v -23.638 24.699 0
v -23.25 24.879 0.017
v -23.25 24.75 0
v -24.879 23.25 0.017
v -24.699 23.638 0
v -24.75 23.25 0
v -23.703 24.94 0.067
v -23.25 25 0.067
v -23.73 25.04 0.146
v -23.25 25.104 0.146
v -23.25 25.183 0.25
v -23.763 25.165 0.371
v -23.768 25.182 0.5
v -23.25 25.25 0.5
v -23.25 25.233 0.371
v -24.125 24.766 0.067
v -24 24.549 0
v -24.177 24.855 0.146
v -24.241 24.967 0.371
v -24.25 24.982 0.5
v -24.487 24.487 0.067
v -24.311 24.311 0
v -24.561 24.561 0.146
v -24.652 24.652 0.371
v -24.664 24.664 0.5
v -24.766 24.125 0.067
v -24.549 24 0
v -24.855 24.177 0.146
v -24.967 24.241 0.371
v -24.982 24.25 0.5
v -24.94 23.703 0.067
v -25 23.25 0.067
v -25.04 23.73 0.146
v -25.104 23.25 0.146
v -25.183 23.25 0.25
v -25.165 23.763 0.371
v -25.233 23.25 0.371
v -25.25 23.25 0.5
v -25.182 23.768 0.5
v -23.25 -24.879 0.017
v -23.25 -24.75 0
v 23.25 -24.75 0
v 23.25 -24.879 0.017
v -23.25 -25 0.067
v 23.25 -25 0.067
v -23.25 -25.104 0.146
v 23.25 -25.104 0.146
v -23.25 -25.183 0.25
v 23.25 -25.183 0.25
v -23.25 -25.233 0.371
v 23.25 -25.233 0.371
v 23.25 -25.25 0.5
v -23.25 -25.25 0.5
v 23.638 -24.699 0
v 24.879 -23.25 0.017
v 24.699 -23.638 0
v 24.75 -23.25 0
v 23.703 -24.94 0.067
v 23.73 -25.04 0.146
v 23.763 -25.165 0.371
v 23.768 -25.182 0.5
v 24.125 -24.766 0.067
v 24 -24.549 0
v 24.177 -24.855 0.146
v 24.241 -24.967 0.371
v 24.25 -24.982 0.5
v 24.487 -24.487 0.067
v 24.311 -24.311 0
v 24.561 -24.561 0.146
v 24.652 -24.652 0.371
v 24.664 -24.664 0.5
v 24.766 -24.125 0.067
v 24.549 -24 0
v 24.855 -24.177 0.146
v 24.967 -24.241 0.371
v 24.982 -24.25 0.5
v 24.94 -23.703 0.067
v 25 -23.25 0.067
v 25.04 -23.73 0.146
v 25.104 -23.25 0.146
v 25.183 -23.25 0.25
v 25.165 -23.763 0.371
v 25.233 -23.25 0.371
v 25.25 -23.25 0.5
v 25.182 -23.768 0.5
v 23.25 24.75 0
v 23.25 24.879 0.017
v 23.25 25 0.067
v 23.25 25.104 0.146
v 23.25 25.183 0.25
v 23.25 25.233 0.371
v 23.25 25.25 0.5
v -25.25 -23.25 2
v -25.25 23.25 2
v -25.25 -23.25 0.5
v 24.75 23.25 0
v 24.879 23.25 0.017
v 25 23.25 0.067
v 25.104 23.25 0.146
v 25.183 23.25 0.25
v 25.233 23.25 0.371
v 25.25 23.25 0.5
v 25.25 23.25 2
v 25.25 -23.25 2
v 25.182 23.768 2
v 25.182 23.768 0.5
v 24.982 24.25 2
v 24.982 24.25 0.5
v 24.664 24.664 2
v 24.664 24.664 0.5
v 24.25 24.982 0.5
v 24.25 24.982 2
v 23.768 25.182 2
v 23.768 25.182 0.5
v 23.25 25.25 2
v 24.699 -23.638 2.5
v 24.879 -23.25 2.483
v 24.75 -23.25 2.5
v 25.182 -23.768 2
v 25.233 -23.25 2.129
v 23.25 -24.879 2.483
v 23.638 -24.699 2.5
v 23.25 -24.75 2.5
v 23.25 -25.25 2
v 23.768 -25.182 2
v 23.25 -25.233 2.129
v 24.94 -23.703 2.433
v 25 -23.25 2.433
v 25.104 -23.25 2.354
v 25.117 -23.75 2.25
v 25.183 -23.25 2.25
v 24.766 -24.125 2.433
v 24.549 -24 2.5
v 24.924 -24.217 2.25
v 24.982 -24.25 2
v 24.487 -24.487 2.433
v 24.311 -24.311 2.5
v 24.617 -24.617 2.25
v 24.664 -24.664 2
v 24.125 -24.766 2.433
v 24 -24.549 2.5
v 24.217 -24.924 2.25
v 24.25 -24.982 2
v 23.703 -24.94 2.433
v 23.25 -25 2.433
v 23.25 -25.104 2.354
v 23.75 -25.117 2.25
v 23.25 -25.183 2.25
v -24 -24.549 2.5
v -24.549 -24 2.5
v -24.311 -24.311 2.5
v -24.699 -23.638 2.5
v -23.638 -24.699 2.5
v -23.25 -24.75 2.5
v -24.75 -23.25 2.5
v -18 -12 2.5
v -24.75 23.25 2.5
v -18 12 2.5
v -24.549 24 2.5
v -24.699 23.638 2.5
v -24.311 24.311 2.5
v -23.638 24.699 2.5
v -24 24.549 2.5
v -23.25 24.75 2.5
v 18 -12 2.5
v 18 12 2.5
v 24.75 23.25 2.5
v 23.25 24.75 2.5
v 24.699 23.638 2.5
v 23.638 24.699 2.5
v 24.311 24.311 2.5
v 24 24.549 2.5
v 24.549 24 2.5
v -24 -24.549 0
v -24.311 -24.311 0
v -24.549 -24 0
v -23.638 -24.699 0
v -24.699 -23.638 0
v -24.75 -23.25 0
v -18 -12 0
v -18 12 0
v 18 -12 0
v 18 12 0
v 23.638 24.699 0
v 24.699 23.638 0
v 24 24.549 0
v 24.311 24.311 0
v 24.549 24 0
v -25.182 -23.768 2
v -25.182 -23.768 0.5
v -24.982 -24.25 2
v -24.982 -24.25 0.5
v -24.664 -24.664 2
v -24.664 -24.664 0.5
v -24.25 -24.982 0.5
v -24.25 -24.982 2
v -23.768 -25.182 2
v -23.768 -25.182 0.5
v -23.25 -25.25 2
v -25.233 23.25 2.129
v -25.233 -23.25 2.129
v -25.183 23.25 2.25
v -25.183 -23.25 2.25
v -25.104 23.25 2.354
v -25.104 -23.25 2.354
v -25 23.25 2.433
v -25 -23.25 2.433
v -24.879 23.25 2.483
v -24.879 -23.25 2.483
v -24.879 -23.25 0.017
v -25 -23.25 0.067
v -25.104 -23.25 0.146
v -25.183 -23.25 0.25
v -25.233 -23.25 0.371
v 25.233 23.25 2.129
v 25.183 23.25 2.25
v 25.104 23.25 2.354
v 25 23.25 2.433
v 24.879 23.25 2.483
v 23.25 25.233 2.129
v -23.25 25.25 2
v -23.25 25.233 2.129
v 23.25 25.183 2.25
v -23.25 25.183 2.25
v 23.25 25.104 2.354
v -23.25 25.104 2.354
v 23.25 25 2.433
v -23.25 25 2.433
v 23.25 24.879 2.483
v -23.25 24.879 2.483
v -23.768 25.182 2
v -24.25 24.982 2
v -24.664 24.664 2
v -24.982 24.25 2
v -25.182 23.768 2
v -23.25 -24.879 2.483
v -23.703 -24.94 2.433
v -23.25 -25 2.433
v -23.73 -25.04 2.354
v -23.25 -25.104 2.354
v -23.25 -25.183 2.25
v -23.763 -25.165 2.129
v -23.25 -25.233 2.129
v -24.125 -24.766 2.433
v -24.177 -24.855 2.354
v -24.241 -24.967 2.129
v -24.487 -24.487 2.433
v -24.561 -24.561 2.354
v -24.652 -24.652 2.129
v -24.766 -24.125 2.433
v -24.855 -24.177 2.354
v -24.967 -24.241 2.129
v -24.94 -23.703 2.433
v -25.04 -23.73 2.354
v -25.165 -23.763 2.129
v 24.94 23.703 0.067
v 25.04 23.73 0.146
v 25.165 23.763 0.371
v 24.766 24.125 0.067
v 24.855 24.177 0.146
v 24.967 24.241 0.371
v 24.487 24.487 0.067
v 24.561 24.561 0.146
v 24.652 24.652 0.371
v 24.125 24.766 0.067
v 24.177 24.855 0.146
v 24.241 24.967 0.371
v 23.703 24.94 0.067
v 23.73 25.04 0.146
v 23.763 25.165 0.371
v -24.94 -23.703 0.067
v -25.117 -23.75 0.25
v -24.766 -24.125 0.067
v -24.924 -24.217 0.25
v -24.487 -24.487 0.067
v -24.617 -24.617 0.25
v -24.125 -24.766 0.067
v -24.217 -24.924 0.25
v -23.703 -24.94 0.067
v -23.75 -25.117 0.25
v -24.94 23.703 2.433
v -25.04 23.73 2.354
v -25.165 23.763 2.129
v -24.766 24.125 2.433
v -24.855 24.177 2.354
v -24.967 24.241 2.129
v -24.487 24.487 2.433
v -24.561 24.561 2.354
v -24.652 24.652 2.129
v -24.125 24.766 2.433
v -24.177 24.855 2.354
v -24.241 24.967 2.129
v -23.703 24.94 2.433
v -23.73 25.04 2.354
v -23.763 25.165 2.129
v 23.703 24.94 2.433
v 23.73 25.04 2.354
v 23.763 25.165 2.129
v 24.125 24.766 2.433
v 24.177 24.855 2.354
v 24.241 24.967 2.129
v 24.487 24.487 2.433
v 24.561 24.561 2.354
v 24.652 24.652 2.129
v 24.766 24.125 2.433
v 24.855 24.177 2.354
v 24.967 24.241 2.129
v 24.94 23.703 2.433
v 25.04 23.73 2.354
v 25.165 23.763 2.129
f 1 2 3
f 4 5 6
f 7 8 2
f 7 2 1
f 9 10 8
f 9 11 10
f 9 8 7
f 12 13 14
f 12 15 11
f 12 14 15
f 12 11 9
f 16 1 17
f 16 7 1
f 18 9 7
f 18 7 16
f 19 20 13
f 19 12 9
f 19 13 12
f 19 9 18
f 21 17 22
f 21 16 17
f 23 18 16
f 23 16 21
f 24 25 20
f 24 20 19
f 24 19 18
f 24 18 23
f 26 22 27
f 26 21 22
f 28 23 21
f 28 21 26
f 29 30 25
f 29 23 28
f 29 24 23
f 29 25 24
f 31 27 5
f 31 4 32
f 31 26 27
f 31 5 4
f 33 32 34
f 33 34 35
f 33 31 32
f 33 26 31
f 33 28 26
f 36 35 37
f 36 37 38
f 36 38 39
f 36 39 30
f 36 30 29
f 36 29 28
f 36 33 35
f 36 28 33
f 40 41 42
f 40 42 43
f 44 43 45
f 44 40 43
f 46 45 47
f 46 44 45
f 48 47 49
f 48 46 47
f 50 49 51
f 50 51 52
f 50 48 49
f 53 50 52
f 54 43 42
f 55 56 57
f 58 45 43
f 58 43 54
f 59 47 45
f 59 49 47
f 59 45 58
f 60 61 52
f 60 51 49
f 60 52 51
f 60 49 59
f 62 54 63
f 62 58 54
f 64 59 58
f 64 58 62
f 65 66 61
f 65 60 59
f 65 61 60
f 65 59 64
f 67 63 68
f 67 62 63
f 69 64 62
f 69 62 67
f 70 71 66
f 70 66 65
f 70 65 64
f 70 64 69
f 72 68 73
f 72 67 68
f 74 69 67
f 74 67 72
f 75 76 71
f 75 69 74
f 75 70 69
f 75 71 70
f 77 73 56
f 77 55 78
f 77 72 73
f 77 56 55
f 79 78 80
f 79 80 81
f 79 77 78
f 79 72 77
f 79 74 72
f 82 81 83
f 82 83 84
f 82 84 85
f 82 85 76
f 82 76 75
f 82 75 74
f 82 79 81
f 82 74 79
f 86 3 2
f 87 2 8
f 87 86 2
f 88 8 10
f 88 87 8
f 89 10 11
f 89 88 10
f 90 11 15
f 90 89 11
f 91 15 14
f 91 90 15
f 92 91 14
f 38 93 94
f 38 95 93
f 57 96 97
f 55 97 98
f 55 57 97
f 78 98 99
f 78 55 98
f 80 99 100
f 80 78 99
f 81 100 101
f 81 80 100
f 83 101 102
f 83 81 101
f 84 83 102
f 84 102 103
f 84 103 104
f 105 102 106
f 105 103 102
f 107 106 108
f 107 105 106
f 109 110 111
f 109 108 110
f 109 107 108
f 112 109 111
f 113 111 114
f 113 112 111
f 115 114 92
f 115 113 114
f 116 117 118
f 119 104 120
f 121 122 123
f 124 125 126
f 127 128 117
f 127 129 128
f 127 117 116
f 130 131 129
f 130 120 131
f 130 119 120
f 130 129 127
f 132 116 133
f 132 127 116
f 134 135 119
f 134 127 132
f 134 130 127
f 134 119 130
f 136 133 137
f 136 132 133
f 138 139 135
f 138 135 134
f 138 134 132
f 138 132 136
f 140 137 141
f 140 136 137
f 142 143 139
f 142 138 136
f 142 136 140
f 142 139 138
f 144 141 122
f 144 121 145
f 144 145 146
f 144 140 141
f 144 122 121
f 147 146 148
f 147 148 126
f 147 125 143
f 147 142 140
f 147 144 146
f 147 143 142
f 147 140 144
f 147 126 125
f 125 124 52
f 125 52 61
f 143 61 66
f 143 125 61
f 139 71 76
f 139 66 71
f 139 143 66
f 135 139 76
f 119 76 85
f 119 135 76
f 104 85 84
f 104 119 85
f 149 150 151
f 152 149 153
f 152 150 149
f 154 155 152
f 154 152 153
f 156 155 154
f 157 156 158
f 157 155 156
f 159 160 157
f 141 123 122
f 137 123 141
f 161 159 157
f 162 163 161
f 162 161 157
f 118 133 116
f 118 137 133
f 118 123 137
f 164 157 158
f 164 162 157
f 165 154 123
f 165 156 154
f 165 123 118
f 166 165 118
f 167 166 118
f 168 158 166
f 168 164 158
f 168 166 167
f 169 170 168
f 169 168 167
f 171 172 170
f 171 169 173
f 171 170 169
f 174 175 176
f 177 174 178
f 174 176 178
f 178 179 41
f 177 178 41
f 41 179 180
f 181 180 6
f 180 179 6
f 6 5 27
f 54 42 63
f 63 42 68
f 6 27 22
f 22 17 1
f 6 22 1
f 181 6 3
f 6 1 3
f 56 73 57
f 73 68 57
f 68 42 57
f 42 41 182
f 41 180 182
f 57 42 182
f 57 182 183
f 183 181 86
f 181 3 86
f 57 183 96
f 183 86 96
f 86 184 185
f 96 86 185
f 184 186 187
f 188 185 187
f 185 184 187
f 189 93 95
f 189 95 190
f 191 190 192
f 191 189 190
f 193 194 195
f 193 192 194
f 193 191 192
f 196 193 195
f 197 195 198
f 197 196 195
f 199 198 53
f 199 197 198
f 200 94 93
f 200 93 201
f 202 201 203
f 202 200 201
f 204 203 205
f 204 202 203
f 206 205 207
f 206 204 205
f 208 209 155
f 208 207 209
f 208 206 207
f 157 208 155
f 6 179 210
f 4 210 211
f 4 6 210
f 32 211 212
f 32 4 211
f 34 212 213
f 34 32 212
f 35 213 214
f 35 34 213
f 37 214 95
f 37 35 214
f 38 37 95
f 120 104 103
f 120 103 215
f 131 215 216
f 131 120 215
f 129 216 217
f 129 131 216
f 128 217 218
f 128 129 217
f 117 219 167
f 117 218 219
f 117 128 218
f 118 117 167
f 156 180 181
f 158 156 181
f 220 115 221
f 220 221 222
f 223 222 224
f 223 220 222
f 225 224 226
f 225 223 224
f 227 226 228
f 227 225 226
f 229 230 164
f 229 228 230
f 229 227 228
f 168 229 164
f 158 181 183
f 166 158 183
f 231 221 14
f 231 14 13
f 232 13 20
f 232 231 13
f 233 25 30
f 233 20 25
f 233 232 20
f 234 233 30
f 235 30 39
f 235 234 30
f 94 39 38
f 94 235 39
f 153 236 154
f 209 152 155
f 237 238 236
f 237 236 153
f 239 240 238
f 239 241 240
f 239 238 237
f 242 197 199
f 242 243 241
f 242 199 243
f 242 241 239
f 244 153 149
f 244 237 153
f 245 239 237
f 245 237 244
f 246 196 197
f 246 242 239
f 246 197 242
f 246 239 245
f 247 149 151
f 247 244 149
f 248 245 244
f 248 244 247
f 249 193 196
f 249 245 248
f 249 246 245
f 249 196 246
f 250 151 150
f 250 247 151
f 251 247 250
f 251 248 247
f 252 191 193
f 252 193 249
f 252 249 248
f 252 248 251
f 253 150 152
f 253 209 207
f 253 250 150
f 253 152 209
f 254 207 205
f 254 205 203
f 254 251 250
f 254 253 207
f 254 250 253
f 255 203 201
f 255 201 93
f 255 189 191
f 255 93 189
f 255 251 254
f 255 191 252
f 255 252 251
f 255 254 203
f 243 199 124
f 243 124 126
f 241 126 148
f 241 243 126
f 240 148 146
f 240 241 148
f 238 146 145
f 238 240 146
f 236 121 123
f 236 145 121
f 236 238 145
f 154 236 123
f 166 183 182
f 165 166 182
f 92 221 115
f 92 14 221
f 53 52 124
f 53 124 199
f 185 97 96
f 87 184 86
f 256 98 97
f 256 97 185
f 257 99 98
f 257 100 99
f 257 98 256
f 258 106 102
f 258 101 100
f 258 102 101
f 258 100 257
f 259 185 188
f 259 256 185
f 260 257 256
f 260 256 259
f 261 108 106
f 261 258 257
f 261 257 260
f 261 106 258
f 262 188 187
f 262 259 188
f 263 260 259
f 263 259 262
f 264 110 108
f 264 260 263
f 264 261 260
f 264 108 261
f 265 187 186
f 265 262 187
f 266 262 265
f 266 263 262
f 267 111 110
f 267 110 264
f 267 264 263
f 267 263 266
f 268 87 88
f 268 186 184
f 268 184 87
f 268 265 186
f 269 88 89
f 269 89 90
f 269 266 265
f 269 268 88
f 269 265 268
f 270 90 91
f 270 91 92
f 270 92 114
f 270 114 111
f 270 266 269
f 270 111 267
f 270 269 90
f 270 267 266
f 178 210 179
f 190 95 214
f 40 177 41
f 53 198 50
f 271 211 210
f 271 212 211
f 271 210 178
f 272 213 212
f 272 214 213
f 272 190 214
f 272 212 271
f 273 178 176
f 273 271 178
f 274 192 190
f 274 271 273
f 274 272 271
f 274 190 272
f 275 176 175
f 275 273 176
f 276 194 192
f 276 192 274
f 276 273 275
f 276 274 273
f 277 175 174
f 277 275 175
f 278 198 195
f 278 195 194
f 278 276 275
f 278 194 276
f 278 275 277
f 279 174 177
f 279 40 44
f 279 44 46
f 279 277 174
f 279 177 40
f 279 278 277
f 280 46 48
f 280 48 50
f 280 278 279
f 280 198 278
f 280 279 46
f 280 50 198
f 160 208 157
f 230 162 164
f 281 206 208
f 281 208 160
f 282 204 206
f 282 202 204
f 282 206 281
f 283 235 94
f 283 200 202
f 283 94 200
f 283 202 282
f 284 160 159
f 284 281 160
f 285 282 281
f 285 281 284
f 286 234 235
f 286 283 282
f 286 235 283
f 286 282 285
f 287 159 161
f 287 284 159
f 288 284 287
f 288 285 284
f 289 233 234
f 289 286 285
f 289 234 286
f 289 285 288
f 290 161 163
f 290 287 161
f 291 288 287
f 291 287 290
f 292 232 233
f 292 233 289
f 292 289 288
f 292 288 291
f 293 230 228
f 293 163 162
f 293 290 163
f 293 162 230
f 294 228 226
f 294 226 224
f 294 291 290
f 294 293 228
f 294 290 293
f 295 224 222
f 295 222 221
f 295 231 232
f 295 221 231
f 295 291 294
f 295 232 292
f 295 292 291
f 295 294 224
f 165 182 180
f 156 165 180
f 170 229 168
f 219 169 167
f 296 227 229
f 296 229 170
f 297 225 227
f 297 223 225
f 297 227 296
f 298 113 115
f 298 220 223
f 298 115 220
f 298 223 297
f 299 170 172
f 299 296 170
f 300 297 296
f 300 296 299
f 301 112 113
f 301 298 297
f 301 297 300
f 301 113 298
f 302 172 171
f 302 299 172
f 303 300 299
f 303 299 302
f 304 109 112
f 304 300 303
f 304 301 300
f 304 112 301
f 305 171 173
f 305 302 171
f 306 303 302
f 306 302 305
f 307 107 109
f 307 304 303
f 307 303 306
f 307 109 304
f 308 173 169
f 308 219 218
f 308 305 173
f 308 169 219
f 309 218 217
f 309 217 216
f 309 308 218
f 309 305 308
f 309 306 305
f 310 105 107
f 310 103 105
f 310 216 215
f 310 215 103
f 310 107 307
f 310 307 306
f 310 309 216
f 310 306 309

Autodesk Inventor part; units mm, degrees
ref_plane "YZ Plane" through (0, 0, 0) normal (1, 0, 0) x (0, 1, 0)
ref_plane "XZ Plane" through (0, 0, 0) normal (0, 1, 0) x (-1, 0, 0)
ref_plane "XY Plane" through (0, 0, 0) normal (0, 0, 1) x (1, 0, 0)
sketch "Sketch1" plane through (0, 0, 0) normal (0, 0, 1) x (1, 0, 0)
  line L0 (-35.35, 0) -> (35.35, 0) construction
  line L1 (0, -35.35) -> (0, 35.35) construction
  line L2 (-25.25, 25.25) -> (25.25, 25.25)
  line L3 (25.25, 25.25) -> (25.25, -25.25)
  line L4 (25.25, -25.25) -> (-25.25, -25.25)
  line L5 (-25.25, -25.25) -> (-25.25, 25.25)
  line L6 (-18, 12) -> (18, 12)
  line L7 (18, 12) -> (18, -12)
  line L8 (18, -12) -> (-18, -12)
  line L9 (-18, -12) -> (-18, 12)
  point P0 (0, 0)
  point P1 (0, 25.25)
  point P2 (25.25, 0)
  point P3 (0, 12)
  point P4 (18, 0)
  dimension "d0" = 50.5
  dimension "d1" = 50.5
  dimension "d2" = 36
  dimension "d3" = 24
extrude "Extrusion1" add sketch "Sketch1" along normal blind 2.5
fillet "Fillet1" radius 2 4 edges at (-25.25, -25.25, 1.25) (25.25, -25.25, 1.25) (-25.25, 25.25, 1.25) (25.25, 25.25, 1.25)
fillet "Fillet2" radius 0.5 16 edges at (24.6642, -24.6642, 2.5) (25.25, 0, 2.5) (24.6642, 24.6642, 2.5) (0, 25.25, 2.5) (-24.6642, 24.6642, 2.5) (-25.25, 0, 2.5) (-24.6642, -24.6642, 2.5) (0, -25.25, 2.5) (-24.6642, -24.6642, 0) (-25.25, 0, 0) (-24.6642, 24.6642, 0) (0, 25.25, 0) (24.6642, 24.6642, 0) (25.25, 0, 0) (24.6642, -24.6642, 0) (0, -25.25, 0)
equation "\"d1\" = d0"
properties part number "F114DiaReseau"
